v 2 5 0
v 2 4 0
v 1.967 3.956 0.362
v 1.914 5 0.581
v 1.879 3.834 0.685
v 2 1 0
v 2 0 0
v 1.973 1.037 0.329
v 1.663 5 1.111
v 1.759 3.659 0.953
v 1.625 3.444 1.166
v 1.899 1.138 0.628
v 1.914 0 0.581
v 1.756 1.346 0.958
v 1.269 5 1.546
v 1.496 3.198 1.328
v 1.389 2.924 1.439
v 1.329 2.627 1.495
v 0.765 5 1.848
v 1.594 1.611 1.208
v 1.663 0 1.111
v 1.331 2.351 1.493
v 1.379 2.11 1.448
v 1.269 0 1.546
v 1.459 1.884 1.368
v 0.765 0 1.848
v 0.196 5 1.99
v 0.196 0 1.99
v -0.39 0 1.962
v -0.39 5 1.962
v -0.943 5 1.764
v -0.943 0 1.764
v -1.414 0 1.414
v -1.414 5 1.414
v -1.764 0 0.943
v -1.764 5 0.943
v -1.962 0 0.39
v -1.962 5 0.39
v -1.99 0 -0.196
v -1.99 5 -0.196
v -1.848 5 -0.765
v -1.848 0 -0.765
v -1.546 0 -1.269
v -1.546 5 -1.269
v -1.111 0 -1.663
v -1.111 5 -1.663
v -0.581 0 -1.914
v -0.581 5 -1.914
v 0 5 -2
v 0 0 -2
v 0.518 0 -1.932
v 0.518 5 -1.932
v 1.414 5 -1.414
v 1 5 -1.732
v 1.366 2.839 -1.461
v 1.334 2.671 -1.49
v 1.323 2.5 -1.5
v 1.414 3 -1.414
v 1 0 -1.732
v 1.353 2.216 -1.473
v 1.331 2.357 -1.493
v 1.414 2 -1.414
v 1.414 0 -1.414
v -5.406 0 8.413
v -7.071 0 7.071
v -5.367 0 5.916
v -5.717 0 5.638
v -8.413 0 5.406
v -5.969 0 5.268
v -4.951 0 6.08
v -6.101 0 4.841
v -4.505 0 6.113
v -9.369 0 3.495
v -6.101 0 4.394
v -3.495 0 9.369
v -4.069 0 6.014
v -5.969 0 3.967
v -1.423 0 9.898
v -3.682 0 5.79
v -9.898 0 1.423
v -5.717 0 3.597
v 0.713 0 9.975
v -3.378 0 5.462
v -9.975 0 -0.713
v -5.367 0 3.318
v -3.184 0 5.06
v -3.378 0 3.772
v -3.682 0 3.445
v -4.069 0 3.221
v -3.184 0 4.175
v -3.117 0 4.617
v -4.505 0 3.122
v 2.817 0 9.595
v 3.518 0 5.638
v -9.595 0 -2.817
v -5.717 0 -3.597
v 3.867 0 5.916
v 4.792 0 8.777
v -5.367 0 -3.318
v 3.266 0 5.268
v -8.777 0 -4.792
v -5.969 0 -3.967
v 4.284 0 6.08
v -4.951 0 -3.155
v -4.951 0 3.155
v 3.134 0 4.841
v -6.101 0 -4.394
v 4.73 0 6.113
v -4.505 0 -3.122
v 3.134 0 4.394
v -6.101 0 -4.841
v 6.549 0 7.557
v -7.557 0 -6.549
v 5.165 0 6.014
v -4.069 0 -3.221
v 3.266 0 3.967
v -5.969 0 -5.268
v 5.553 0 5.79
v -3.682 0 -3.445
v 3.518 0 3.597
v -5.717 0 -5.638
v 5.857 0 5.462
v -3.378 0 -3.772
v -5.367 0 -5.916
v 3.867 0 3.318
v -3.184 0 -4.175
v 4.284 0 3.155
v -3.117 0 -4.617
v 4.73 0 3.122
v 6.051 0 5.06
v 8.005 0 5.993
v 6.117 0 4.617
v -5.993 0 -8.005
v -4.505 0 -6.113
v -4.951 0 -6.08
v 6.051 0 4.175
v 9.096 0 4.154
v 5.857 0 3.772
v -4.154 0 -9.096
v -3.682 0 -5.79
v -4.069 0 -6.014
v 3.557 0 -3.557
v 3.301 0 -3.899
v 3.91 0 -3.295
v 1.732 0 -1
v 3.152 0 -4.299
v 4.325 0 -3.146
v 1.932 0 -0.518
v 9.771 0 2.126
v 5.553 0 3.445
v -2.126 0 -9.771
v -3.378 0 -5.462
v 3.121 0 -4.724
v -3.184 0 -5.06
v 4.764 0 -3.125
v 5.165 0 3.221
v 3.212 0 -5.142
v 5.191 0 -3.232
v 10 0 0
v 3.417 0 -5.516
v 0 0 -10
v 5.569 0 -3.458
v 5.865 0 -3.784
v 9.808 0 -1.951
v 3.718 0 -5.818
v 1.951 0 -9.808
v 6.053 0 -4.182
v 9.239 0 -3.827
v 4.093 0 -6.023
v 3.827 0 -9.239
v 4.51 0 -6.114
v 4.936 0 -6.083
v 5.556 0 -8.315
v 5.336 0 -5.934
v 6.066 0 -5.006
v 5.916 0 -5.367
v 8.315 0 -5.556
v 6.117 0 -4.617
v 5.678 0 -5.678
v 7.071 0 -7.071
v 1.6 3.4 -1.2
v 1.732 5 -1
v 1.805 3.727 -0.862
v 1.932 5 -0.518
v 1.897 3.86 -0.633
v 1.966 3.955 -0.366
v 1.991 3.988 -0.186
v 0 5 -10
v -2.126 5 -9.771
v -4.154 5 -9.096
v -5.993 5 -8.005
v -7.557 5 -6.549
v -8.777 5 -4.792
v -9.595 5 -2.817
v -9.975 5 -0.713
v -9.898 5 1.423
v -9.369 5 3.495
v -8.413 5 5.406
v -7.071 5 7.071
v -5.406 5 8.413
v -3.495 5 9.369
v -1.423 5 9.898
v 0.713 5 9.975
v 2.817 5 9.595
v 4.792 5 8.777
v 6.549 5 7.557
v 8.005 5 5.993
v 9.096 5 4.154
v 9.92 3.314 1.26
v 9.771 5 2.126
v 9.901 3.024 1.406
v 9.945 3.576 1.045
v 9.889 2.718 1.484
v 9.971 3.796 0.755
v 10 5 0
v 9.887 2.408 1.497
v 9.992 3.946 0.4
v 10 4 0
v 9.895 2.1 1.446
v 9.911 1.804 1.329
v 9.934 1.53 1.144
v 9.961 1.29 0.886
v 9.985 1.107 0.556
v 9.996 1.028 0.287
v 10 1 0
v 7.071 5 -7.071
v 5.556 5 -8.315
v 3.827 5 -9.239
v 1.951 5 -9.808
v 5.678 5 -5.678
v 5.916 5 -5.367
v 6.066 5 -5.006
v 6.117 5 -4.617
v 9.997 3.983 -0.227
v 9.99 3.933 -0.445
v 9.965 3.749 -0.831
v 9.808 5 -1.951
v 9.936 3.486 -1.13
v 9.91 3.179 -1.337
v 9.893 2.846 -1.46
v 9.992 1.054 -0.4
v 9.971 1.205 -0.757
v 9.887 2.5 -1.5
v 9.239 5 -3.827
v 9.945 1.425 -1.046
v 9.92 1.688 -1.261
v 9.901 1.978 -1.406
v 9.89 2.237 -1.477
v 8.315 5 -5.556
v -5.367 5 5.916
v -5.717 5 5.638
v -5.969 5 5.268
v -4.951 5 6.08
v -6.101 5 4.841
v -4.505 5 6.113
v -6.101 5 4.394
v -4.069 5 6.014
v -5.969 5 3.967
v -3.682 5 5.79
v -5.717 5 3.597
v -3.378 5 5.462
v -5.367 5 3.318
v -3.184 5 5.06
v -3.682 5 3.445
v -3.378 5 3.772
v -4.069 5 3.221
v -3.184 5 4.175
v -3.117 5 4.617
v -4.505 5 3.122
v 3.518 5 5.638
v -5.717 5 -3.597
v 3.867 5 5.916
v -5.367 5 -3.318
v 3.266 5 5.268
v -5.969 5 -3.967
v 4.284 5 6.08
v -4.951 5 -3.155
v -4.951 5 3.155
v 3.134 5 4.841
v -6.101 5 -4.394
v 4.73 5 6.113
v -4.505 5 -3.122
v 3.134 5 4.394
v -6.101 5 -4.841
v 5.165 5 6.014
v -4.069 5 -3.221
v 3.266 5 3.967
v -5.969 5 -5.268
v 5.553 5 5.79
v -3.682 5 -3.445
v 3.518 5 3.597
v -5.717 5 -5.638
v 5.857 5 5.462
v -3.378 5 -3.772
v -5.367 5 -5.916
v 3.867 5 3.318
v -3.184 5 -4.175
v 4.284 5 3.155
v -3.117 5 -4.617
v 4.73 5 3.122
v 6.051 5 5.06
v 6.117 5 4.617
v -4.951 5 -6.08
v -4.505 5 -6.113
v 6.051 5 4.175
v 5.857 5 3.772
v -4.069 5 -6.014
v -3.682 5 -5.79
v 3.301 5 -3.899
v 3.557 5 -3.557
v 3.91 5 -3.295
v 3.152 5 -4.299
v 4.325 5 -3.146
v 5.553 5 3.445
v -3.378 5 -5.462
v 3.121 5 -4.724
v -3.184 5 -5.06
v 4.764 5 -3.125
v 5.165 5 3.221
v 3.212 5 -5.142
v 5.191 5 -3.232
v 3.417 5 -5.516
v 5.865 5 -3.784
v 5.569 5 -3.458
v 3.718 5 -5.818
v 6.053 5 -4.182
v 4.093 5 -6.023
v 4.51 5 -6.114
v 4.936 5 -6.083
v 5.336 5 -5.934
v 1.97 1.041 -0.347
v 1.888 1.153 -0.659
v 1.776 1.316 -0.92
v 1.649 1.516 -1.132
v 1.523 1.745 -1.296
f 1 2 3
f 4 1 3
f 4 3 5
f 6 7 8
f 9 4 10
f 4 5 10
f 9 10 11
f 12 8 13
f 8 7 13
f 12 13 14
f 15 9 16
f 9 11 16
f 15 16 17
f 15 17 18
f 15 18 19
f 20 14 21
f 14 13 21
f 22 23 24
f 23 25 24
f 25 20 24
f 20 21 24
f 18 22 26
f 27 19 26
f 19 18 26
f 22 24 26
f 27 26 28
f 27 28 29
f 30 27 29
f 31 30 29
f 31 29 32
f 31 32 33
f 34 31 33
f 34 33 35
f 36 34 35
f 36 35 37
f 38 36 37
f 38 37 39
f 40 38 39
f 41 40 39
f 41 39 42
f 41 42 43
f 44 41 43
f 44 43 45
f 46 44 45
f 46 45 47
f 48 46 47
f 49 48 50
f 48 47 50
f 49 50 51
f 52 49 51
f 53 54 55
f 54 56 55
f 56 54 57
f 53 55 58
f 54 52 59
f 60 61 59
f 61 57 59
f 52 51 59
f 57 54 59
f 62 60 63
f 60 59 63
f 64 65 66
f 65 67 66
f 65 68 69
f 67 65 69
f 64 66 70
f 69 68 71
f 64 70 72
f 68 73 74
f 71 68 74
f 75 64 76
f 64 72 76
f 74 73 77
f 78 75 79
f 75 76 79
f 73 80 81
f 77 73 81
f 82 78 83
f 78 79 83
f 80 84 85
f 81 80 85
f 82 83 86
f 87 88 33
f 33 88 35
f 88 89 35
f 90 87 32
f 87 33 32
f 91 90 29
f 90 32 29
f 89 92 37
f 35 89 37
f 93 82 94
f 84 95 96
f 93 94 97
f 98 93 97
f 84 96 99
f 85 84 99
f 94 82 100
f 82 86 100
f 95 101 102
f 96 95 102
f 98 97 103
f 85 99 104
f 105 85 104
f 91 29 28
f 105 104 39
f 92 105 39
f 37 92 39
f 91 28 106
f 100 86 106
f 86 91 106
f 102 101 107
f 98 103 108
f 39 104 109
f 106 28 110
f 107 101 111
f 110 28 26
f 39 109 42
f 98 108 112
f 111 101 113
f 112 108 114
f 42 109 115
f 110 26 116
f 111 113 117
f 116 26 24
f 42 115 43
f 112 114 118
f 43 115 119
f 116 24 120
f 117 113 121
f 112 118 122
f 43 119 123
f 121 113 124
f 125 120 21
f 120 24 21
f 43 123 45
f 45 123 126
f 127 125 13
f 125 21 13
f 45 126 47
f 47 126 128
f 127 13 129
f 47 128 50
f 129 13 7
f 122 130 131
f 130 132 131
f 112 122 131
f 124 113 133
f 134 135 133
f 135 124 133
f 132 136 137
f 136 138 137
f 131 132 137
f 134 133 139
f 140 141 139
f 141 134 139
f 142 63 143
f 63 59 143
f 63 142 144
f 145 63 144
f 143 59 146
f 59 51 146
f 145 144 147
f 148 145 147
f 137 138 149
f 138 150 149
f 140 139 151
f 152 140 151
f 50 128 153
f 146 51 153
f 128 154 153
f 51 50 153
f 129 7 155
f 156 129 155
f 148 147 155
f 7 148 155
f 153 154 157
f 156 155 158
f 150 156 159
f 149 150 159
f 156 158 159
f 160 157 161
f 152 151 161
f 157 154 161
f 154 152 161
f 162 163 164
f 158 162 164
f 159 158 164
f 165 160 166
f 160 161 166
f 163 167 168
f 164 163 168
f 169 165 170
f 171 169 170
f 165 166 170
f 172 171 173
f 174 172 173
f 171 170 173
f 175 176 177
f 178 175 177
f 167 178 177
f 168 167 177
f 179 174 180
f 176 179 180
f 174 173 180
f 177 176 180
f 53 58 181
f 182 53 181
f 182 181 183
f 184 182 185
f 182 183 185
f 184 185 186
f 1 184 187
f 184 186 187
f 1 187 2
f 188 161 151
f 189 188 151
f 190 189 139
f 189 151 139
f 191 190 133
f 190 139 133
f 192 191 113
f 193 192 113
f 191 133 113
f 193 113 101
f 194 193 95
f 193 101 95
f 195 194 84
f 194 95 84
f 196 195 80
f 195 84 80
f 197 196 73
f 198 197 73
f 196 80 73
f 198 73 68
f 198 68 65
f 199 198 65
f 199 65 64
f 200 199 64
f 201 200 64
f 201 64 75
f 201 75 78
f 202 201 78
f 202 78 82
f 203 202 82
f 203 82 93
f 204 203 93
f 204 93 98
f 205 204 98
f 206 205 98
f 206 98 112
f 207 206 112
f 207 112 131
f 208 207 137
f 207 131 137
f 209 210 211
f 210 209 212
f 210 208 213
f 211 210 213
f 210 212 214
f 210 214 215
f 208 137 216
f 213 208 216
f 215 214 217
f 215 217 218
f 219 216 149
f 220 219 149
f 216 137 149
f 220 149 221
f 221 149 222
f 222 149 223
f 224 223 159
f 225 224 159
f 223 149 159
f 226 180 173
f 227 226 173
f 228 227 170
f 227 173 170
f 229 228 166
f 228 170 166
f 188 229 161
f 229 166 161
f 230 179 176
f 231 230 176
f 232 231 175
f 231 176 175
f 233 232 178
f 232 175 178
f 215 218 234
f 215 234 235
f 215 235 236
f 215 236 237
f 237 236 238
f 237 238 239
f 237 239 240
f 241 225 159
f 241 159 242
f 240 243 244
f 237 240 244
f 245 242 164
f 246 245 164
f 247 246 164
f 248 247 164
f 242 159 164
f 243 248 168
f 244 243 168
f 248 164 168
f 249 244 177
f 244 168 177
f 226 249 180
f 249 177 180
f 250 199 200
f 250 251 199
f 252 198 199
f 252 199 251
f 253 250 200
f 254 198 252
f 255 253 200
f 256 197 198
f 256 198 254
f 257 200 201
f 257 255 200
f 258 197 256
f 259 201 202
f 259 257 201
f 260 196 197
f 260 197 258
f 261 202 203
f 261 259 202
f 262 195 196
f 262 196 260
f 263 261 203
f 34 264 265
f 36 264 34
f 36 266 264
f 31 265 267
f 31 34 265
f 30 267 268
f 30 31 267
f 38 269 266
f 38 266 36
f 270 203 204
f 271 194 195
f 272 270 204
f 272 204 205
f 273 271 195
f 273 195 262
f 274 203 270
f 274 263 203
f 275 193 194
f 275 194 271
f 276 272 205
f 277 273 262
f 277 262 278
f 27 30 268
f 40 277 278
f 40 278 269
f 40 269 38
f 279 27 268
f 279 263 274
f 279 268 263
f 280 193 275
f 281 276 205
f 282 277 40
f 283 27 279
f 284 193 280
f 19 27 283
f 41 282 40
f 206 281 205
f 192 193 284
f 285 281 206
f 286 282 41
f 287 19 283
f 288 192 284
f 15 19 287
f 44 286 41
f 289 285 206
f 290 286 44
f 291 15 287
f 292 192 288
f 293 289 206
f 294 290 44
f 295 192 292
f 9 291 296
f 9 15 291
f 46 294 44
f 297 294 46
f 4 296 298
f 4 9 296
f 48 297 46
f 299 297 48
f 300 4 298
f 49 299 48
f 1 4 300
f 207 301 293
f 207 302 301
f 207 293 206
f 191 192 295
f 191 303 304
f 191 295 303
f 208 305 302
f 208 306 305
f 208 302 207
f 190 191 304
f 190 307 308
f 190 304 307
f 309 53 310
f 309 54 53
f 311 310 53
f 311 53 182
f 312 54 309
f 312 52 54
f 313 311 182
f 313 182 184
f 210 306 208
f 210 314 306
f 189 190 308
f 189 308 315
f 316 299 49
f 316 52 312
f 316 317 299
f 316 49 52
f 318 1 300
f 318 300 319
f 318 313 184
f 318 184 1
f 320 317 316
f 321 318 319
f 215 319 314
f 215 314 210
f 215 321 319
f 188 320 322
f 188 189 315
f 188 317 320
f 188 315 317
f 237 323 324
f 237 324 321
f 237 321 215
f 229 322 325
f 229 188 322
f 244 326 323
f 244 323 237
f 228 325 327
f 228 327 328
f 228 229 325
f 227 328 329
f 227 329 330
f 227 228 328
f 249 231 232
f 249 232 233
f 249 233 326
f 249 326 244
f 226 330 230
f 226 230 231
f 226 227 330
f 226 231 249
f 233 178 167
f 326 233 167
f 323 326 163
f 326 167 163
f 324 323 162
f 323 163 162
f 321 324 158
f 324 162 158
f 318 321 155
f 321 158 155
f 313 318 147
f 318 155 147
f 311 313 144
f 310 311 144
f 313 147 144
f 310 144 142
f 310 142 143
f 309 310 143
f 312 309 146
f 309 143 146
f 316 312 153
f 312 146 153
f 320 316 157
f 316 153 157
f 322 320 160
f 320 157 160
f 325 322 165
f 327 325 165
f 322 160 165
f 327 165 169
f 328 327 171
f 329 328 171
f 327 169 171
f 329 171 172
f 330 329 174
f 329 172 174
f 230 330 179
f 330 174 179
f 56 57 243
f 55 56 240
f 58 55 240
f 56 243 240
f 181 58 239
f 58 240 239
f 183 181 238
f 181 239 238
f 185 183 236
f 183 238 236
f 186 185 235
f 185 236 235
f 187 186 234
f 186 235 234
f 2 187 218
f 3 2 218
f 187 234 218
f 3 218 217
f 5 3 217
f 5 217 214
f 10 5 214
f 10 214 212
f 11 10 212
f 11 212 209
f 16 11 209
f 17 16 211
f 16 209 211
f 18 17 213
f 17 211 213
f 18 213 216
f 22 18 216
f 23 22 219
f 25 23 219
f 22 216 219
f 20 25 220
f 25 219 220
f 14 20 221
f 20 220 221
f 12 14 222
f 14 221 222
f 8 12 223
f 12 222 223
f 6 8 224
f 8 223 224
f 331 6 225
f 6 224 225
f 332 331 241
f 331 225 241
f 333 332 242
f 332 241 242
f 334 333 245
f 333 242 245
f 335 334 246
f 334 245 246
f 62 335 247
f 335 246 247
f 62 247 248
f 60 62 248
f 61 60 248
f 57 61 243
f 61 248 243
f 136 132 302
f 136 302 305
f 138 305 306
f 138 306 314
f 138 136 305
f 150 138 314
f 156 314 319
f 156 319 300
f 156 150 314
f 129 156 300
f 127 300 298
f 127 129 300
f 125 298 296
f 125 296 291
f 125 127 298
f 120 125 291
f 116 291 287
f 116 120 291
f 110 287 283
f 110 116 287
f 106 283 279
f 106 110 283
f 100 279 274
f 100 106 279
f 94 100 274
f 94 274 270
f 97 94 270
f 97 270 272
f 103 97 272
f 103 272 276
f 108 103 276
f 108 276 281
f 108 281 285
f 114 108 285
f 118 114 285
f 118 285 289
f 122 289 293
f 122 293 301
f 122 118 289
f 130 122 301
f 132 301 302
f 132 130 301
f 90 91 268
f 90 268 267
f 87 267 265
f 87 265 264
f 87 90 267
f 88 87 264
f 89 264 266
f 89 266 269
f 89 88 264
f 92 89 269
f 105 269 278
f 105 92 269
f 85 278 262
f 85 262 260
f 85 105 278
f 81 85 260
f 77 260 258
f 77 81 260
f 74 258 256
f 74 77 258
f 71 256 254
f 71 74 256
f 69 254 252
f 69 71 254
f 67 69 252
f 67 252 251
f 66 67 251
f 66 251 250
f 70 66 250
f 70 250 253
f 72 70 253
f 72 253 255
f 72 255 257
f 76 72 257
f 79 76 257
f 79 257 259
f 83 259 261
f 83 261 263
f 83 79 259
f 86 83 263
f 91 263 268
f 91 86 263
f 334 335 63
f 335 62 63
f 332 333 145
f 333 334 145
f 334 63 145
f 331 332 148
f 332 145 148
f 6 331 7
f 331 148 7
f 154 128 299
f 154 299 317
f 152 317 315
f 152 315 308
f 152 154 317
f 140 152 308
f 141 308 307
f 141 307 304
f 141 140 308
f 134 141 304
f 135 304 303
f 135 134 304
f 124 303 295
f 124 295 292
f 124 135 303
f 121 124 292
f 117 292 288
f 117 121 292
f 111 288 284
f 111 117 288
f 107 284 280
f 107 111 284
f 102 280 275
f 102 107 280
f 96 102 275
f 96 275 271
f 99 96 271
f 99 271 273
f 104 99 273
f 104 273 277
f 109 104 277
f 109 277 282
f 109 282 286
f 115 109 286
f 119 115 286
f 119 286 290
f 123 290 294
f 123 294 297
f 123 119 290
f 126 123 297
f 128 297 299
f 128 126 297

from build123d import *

# Parameters (mm, degrees)
SKETCH_1_R          = 1.5
EXTRUDE_1_DEPTH     = 5
SKETCH_2_R          = 1.5
CUT_EXTRUDE_4_DEPTH = 9


with BuildPart() as part:
    # Эскиз1 → Бобышка-Вытянуть1 (new body)
    with BuildSketch(Plane(origin=(0, 0, 0), x_dir=(1, 0, 0), z_dir=(0, 1, 0))):
        with BuildLine():
            Line((0, 10), (0, 2))
            ThreePointArc((0, 2), (0.765366865, 1.847759065), (1.414213562, 1.414213562))
            Line((1.414213562, 1.414213562), (3.556747109, 3.556747109))
            ThreePointArc((3.556747109, 3.556747109), (3.556747109, 5.678067453), (5.678067453, 5.678067453))
            Line((5.678067453, 5.678067453), (7.071067812, 7.071067812))
            ThreePointArc((7.071067812, 7.071067812), (3.826834324, 9.238795325), (0, 10))
        make_face()
        with BuildLine():
            ThreePointArc((2, 0), (-1.414213562, -1.414213562), (0, 2))
            Line((0, 2), (0, 10))
            ThreePointArc((0, 10), (-7.071067812, -7.071067812), (10, 0))
            ThreePointArc((10, 0), (9.238795325, 3.826834324), (7.071067812, 7.071067812))
            Line((7.071067812, 7.071067812), (5.678067453, 5.678067453))
            ThreePointArc((5.678067453, 5.678067453), (6.00322658, 5.19143243), (6.117407281, 4.617407281))
            ThreePointArc((6.117407281, 4.617407281), (5.19143243, 3.231587982), (3.556747109, 3.556747109))
            Line((3.556747109, 3.556747109), (1.414213562, 1.414213562))
            ThreePointArc((1.414213562, 1.414213562), (1.847759065, 0.765366865), (2, 0))
        make_face()
        with Locations((-4.617407281, -4.617407281)):
            Circle(SKETCH_1_R, mode=Mode.SUBTRACT)
        with Locations((4.617407281, -4.617407281)):
            Circle(SKETCH_1_R, mode=Mode.SUBTRACT)
        with Locations((-4.617407281, 4.617407281)):
            Circle(SKETCH_1_R, mode=Mode.SUBTRACT)
    extrude(amount=EXTRUDE_1_DEPTH)

    # Эскиз2 → Вырез-Вытянуть4 (cut)
    with BuildSketch(Plane(origin=(10, 0, 0), x_dir=(0, 0, -1), z_dir=(1, 0, 0))):
        with Locations((0, 2.5)):
            Circle(SKETCH_2_R)
    extrude(amount=-CUT_EXTRUDE_4_DEPTH, mode=Mode.SUBTRACT)


solid = part.part
